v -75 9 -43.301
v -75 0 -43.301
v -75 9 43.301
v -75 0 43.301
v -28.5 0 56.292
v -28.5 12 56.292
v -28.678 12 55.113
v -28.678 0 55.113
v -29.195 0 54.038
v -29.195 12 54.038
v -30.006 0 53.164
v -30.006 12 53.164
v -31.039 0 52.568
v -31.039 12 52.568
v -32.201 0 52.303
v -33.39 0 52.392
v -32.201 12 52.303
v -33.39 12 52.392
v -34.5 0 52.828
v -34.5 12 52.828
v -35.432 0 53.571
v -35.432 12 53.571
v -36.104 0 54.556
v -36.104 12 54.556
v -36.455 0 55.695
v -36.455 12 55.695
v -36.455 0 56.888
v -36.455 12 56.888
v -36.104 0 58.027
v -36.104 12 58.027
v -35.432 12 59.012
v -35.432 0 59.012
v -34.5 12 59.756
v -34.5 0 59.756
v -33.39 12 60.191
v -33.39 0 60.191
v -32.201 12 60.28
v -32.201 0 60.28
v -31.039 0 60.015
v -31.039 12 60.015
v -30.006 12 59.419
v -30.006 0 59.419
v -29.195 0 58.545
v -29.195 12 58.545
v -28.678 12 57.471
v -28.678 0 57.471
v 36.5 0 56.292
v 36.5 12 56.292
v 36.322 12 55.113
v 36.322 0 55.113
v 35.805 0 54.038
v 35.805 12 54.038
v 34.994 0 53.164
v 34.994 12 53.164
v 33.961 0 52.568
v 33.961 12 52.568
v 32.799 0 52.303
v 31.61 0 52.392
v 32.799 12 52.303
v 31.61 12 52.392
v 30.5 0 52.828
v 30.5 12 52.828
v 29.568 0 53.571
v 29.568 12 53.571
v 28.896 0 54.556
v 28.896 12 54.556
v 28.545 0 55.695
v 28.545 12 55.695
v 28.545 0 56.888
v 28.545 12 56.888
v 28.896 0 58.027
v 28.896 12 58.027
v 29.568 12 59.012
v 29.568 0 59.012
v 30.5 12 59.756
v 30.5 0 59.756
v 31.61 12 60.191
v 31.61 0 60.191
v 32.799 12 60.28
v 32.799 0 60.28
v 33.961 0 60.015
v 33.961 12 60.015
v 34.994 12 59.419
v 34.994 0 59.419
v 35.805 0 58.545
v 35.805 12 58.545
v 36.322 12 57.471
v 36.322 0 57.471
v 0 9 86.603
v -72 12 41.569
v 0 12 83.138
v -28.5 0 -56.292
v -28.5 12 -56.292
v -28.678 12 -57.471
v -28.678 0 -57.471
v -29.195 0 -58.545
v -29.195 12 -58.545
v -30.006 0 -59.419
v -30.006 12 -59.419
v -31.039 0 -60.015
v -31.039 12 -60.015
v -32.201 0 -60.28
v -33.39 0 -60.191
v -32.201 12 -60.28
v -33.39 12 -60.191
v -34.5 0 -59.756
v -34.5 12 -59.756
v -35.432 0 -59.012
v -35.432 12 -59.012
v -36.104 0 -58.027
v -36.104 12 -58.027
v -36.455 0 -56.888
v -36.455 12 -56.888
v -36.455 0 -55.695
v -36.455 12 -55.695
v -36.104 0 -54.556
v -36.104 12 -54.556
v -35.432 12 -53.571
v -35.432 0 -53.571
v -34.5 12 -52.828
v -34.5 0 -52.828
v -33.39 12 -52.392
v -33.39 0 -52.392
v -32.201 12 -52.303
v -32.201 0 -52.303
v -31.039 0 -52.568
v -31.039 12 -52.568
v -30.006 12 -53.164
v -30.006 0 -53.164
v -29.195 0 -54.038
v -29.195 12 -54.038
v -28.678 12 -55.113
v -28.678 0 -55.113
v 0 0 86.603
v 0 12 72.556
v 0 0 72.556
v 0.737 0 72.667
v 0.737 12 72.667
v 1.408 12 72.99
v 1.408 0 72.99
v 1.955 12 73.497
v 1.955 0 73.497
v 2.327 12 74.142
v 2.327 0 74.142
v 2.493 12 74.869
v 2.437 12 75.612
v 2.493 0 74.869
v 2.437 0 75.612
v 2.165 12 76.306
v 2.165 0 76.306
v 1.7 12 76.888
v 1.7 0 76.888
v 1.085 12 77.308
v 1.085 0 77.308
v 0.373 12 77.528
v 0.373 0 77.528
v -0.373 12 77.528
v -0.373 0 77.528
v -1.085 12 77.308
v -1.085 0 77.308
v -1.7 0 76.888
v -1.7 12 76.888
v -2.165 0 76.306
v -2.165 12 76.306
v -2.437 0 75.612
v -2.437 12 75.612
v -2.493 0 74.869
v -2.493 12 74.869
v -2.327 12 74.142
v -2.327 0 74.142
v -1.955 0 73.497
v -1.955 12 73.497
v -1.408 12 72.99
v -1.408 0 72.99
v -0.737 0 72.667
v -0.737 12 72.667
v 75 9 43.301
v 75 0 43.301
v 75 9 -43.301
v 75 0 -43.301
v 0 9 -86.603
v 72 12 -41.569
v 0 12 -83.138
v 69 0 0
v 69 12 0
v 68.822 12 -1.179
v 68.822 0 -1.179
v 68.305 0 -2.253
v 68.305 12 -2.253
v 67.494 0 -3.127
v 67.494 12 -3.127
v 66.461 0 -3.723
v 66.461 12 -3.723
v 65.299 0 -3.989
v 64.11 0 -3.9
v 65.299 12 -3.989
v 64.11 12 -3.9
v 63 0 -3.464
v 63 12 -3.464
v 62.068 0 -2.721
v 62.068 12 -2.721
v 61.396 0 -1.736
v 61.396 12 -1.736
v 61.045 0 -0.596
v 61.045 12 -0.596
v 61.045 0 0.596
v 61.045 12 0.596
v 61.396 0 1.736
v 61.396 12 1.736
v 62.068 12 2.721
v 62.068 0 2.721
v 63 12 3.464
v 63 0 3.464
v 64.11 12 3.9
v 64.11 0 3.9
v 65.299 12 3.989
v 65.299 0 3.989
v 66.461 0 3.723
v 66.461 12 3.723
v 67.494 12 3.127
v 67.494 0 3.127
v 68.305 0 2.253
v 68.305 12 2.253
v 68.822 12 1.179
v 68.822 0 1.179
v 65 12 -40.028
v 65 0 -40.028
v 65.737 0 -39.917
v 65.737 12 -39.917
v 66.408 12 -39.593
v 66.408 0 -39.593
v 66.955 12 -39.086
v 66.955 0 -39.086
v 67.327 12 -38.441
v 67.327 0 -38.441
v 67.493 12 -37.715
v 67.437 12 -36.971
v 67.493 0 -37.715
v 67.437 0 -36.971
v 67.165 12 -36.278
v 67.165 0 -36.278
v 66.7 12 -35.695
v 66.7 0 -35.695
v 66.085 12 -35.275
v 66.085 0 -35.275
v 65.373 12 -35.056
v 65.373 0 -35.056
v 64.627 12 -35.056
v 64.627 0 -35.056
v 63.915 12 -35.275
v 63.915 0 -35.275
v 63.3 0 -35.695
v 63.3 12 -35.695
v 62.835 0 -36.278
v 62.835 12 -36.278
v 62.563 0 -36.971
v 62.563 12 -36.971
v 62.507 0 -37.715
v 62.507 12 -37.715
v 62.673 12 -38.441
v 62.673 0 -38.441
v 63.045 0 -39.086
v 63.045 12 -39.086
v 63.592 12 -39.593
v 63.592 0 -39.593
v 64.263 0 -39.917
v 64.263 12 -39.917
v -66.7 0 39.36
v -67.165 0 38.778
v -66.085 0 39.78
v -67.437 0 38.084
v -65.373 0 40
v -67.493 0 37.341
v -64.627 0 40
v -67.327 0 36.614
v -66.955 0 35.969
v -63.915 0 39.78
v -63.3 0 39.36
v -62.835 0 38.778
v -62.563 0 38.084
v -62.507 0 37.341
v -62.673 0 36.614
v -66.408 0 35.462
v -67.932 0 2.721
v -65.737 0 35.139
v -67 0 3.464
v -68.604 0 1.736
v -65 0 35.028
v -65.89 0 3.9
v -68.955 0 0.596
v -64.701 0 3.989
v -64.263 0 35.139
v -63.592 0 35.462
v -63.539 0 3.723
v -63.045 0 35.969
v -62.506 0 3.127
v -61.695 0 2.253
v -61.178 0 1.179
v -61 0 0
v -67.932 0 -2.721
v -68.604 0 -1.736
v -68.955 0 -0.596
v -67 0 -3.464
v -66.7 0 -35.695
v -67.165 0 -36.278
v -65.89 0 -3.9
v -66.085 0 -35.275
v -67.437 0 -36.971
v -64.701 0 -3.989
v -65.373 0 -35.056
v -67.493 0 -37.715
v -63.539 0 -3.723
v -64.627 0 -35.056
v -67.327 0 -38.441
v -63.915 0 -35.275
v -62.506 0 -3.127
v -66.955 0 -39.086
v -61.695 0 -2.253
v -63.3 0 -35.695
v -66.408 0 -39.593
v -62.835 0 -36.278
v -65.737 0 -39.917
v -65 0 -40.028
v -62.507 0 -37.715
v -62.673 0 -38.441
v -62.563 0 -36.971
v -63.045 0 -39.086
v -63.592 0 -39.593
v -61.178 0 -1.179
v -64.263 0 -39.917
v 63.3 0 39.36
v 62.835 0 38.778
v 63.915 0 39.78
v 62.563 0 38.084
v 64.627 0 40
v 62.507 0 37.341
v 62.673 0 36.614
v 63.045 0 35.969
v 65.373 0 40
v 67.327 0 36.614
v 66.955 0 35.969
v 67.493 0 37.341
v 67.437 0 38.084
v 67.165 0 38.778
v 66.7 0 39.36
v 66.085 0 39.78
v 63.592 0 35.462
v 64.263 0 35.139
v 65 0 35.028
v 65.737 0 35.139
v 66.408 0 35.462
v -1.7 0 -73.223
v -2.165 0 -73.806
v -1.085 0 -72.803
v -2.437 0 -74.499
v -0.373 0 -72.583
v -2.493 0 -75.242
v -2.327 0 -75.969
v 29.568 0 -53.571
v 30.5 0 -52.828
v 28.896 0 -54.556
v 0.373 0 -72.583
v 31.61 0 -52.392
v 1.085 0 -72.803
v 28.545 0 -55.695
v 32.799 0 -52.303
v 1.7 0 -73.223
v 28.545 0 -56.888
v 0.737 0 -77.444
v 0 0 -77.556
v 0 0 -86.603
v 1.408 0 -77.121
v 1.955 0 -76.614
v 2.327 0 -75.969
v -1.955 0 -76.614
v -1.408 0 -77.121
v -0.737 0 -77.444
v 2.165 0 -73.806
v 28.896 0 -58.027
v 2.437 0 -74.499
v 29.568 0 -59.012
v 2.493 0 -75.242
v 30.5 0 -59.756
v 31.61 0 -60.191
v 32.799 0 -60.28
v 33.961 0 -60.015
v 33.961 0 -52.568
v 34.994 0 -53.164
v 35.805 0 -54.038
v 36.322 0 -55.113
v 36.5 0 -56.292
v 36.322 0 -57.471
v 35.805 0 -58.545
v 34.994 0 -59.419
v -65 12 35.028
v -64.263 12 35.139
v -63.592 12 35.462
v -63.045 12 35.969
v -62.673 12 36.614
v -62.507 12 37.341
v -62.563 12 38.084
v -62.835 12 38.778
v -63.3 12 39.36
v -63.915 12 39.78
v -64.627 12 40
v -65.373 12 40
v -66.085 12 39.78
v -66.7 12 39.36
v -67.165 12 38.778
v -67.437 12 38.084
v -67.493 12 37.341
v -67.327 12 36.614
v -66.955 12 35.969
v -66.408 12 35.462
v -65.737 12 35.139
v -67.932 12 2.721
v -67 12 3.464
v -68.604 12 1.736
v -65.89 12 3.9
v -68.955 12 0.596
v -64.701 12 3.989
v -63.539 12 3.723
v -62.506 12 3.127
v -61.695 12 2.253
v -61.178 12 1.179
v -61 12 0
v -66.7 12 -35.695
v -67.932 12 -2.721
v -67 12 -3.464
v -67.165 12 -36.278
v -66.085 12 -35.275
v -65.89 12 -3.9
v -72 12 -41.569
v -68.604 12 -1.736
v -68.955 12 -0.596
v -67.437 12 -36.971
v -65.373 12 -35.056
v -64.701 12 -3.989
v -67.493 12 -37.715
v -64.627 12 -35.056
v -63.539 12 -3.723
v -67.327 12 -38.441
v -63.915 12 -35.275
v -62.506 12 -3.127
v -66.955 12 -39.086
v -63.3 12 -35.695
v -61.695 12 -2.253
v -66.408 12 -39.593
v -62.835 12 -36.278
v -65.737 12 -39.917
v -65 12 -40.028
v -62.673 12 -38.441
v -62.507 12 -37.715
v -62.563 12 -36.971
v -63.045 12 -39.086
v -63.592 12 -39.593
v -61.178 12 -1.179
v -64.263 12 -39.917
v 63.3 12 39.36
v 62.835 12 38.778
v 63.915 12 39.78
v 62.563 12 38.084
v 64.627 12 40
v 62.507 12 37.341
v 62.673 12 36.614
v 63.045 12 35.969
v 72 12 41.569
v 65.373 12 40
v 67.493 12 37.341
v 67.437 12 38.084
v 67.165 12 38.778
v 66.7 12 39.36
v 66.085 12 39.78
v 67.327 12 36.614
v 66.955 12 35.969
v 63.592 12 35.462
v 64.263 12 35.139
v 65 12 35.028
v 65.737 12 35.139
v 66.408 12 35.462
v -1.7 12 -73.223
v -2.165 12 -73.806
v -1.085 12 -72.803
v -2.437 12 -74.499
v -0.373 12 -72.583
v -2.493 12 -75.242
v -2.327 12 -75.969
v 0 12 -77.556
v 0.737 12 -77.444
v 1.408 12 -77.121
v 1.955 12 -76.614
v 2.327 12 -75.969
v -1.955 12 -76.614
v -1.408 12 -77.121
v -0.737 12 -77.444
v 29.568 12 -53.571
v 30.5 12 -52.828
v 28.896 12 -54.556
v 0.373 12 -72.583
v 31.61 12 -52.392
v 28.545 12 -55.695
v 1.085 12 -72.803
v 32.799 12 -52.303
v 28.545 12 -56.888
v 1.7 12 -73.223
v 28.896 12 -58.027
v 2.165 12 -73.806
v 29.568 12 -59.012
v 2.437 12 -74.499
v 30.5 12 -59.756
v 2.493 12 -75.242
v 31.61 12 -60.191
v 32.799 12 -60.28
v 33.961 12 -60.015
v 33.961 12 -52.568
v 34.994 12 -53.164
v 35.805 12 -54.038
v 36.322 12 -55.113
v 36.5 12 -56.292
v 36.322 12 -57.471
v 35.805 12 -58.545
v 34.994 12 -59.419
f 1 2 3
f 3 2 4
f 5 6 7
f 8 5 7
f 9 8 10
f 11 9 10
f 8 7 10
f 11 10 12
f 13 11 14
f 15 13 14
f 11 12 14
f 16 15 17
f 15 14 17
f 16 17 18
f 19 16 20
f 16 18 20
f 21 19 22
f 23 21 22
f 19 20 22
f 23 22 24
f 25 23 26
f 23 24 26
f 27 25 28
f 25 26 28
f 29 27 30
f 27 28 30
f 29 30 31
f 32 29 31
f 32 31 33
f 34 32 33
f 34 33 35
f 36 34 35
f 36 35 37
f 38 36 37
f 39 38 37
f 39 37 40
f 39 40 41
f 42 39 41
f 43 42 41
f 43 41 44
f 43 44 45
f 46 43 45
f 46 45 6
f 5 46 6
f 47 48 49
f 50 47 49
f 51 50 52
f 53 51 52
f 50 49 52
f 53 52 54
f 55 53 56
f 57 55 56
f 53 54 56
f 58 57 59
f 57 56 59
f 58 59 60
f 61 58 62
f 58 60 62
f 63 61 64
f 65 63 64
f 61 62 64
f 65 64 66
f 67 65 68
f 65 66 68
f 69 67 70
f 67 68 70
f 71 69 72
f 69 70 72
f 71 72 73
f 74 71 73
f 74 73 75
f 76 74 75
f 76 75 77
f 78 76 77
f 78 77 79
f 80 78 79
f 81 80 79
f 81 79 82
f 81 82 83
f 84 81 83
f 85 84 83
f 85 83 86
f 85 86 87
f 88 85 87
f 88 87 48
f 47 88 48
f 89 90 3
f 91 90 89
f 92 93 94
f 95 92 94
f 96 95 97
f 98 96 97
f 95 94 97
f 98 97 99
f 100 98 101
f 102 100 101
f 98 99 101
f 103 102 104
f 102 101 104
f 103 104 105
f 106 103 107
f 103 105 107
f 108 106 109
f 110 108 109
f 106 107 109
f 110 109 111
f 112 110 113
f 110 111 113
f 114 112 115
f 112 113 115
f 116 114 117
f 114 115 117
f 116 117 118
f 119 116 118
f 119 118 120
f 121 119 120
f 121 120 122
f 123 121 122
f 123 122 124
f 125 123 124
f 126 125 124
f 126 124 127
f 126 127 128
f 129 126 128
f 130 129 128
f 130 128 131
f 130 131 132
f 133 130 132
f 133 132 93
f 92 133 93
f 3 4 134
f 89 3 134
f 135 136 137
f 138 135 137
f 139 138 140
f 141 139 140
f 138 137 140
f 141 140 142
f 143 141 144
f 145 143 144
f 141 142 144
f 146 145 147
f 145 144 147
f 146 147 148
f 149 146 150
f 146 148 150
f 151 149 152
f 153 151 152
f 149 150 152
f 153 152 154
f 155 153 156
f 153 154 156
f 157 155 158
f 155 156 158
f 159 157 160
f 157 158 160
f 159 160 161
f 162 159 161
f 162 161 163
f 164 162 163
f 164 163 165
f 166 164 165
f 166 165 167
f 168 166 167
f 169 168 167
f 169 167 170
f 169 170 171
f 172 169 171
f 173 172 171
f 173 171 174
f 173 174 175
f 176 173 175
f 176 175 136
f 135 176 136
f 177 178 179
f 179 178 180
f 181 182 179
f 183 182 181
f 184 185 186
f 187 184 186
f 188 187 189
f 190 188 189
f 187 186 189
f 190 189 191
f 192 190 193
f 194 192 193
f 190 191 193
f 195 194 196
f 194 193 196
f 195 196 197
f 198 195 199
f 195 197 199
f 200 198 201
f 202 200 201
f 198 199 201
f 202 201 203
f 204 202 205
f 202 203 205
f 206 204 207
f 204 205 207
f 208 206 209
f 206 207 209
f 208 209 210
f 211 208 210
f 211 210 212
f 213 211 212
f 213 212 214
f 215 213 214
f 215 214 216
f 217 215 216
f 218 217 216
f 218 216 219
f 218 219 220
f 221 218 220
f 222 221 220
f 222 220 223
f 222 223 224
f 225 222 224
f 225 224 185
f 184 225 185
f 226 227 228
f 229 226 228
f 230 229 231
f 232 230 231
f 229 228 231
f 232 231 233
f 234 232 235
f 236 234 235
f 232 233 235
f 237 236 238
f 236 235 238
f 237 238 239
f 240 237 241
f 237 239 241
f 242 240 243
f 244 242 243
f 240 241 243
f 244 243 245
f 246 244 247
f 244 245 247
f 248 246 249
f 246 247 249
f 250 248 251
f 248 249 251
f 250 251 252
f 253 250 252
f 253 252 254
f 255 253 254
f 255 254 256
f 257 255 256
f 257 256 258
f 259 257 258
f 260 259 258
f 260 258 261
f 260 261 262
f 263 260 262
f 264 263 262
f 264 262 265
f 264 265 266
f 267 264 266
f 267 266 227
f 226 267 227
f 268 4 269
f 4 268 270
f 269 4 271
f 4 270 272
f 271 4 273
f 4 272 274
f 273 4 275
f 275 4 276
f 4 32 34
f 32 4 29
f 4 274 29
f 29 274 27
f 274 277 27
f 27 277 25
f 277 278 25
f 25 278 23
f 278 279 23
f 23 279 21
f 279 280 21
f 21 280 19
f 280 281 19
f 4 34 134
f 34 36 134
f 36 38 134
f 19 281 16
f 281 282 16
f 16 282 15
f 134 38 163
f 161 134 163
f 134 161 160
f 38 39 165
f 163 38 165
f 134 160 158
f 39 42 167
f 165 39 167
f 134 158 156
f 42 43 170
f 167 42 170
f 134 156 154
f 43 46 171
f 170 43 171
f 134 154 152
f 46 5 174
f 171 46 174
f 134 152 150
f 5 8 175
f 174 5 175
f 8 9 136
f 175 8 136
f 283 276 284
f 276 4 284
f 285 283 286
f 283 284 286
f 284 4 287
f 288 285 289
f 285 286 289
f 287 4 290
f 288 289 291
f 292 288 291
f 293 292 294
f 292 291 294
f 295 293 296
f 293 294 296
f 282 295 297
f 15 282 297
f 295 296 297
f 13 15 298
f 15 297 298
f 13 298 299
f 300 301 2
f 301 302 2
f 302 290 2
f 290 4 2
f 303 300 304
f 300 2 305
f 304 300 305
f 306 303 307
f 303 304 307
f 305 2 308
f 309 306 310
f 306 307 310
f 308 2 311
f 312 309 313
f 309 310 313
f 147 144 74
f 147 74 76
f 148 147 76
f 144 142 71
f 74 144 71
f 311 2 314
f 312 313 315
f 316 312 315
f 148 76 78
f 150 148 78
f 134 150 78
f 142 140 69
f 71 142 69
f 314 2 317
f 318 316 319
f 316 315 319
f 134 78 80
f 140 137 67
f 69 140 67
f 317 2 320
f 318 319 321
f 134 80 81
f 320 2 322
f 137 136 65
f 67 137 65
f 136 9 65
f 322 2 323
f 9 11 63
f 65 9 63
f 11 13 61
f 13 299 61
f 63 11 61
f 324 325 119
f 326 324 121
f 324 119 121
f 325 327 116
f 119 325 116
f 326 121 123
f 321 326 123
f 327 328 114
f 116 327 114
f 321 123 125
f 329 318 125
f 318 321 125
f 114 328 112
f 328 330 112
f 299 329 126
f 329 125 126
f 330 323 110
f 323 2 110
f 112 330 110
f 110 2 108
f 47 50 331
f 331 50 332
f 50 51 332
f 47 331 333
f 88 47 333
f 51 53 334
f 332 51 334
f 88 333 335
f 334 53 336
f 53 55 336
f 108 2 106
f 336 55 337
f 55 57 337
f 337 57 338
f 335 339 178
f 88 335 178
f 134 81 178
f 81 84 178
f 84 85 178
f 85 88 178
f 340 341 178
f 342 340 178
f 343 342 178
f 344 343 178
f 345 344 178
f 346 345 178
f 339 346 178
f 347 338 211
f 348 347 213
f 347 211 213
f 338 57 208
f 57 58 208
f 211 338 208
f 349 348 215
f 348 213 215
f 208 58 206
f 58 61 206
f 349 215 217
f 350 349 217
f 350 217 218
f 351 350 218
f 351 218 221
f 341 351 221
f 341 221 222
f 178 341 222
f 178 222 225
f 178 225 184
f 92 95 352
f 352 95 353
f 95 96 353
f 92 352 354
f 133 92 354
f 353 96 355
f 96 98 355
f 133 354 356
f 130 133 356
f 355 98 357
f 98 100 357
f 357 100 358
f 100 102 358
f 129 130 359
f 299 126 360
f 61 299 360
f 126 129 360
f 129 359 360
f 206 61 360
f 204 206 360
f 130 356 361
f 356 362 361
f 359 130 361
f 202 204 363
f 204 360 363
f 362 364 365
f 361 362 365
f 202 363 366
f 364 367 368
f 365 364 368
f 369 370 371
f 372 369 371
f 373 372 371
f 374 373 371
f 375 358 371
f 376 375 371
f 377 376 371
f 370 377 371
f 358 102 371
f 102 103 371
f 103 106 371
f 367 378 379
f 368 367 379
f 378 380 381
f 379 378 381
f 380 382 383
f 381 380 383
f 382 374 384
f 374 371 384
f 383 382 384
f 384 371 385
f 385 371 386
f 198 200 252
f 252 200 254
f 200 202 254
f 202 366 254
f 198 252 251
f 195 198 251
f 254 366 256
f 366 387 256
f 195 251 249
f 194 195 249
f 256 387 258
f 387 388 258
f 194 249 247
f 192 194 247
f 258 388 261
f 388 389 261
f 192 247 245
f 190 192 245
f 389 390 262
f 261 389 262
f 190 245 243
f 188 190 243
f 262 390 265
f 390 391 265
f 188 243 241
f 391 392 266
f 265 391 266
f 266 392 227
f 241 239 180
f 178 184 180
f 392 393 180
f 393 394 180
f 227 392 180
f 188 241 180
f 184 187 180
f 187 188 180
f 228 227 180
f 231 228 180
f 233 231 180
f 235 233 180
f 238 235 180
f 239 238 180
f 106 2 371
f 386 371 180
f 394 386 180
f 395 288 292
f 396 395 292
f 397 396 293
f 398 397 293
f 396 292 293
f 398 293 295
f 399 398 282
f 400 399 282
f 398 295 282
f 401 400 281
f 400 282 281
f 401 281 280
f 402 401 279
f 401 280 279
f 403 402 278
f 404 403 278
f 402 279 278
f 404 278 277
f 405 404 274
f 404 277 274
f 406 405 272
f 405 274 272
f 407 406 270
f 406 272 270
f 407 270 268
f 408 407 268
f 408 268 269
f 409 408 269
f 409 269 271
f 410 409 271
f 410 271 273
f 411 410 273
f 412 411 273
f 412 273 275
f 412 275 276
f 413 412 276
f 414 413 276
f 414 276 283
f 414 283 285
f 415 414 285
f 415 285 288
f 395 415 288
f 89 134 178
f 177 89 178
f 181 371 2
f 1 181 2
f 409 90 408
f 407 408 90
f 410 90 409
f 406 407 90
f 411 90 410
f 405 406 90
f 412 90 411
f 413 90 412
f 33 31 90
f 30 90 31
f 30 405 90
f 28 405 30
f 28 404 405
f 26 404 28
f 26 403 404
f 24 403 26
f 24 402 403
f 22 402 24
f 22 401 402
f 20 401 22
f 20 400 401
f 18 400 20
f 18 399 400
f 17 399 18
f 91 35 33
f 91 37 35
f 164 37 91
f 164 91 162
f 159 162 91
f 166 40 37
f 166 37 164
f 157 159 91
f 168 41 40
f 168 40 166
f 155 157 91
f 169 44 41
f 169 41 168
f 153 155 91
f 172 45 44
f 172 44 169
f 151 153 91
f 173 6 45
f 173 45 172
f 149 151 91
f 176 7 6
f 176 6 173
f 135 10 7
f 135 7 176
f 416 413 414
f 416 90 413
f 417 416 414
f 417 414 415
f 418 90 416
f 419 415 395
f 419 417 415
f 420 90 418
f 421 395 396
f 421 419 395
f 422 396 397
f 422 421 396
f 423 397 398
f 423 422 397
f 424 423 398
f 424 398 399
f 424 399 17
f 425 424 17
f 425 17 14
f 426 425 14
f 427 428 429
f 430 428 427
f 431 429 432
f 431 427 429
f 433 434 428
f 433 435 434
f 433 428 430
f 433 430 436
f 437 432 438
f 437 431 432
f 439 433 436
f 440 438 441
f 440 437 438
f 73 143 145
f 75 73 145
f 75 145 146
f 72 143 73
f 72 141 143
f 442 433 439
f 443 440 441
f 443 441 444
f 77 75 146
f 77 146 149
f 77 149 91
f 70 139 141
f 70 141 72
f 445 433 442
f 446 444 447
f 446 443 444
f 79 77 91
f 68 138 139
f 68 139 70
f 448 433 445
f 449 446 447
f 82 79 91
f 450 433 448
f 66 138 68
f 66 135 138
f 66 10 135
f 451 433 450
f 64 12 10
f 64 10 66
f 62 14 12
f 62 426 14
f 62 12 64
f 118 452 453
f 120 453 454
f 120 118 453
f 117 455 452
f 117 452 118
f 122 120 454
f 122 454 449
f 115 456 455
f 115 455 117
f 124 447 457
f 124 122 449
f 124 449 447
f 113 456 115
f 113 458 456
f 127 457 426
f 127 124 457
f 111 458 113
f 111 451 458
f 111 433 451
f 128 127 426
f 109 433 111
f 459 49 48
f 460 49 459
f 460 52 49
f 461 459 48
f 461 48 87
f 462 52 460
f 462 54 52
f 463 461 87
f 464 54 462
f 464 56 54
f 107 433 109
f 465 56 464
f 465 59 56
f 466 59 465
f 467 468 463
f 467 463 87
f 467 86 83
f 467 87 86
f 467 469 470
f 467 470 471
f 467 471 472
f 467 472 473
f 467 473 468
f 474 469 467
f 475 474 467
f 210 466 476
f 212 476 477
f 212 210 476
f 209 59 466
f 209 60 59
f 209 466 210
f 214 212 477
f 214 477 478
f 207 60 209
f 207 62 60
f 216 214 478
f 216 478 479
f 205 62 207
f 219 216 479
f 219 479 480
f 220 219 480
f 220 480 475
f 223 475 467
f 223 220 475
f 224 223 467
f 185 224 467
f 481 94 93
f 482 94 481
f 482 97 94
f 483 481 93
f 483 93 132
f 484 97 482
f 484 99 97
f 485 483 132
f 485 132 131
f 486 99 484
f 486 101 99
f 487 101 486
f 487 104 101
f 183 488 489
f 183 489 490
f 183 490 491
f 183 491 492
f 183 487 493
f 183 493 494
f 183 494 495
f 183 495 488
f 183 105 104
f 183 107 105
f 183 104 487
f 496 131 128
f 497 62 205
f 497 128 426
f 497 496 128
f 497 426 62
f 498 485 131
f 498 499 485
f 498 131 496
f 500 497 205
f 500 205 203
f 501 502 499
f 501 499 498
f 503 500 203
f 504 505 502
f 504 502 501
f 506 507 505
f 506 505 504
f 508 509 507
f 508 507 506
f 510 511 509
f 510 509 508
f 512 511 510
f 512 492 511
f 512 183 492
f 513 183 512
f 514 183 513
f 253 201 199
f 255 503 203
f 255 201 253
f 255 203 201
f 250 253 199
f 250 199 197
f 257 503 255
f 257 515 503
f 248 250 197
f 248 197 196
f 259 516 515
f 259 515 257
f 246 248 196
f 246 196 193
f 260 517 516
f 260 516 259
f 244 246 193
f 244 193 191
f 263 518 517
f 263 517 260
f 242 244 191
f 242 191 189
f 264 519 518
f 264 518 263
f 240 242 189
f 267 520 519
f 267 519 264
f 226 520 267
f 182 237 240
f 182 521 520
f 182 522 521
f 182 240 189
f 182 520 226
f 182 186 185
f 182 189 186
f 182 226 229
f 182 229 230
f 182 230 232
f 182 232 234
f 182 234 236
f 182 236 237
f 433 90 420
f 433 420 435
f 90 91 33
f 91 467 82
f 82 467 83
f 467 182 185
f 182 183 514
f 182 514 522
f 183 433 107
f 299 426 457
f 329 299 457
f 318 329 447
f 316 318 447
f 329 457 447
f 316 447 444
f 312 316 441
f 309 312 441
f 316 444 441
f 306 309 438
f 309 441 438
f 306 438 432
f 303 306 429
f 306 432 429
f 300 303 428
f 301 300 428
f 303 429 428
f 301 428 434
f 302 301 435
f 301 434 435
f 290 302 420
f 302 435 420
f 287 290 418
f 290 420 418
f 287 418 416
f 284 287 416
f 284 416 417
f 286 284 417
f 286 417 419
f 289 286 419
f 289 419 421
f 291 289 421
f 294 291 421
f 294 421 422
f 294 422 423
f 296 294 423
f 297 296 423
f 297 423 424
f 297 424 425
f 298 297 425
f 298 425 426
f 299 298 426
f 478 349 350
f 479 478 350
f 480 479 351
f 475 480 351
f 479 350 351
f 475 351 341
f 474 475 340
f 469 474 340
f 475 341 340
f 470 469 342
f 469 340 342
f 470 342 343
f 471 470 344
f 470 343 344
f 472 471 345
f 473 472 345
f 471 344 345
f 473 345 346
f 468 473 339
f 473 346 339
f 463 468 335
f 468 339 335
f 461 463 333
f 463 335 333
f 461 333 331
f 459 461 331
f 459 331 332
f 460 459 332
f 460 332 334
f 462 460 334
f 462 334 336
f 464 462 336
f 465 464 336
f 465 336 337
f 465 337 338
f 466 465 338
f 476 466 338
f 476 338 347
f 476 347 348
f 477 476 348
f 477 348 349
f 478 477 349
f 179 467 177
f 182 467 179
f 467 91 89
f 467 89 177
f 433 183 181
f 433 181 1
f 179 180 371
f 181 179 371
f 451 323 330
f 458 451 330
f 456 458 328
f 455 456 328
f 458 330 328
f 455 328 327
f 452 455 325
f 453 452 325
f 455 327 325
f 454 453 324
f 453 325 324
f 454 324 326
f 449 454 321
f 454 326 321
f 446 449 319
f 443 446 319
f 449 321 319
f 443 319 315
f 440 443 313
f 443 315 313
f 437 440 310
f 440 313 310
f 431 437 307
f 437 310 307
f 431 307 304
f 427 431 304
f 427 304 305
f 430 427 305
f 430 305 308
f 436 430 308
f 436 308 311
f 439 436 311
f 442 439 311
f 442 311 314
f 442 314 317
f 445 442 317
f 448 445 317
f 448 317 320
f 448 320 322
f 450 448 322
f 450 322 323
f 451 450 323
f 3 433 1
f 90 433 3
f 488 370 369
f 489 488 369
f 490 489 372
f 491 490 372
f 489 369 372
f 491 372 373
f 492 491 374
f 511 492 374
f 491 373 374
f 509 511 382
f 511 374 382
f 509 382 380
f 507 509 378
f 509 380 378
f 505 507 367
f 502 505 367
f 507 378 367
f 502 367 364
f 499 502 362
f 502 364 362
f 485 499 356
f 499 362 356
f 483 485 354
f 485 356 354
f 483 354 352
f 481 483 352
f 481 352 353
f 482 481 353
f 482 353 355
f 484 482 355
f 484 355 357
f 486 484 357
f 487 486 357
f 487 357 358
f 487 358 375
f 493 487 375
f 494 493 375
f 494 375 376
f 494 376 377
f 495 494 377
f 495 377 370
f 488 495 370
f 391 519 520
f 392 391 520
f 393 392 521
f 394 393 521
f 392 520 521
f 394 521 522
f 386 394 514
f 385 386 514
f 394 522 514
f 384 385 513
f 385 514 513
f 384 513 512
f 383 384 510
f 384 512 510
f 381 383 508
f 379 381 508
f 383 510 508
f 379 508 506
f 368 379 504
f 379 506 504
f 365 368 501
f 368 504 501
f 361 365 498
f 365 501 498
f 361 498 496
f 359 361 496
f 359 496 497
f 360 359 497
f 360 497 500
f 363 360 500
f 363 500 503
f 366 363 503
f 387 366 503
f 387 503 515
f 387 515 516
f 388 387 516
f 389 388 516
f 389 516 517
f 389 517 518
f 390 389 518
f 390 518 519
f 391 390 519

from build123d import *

# Parameters (mm, degrees)
EXTRUDE_1_DEPTH     = 12
CHAMFER_1_SIZE      = 3
SKETCH_2_R          = 4
CUT_EXTRUDE_1_DEPTH = 13
M6X1_0_1_D          = 5


with BuildPart() as part:
    # 草圖1 → 填料-伸長1 (new body)
    with BuildSketch(Plane(origin=(0, 0, 0), x_dir=(1, 0, 0), z_dir=(0, 1, 0))):
        Polygon((0, 86.602540378), (-75, 43.301270189), (-75, -43.301270189), (0, -86.602540378), (75, -43.301270189), (75, 43.301270189), align=None)
    extrude(amount=EXTRUDE_1_DEPTH)

    # 導角1
    chamfer_1_edges = [part.edges().sort_by_distance(p)[0] for p in [
        (-75, 12, 0),
        (-37.5, 12, 64.951905284),
        (37.5, 12, 64.951905284),
        (75, 12, 0),
        (37.5, 12, -64.951905284),
        (-37.5, 12, -64.951905284),
    ]]
    chamfer(chamfer_1_edges, length=CHAMFER_1_SIZE)

    # 草圖2 → 除料-伸長1 (cut, through all)
    with BuildSketch(Plane(origin=(0, 12, 0), x_dir=(1, 0, 0), z_dir=(0, 1, 0))):
        with Locations((32.5, 56.291651246)):
            Circle(SKETCH_2_R)
        with Locations((32.5, -56.291651246)):
            Circle(SKETCH_2_R)
        with Locations((65, 0)):
            Circle(SKETCH_2_R)
        with Locations((-65, 0)):
            Circle(SKETCH_2_R)
        with Locations((-32.5, 56.291651246)):
            Circle(SKETCH_2_R)
        with Locations((-32.5, -56.291651246)):
            Circle(SKETCH_2_R)
    extrude(amount=-CUT_EXTRUDE_1_DEPTH, mode=Mode.SUBTRACT)

    # M6x1.0 螺紋孔1 (through all)
    with Locations(Plane(origin=(-65, 12, -37.527767497), x_dir=(0, 0, 1), z_dir=(0, 1, 0))):
        with Locations((0, 0), (-37.527767498, 65), (0, 130), (75.055534994, 130), (112.583302492, 65), (75.055534994, 0)):
            Hole(M6X1_0_1_D / 2)


solid = part.part
